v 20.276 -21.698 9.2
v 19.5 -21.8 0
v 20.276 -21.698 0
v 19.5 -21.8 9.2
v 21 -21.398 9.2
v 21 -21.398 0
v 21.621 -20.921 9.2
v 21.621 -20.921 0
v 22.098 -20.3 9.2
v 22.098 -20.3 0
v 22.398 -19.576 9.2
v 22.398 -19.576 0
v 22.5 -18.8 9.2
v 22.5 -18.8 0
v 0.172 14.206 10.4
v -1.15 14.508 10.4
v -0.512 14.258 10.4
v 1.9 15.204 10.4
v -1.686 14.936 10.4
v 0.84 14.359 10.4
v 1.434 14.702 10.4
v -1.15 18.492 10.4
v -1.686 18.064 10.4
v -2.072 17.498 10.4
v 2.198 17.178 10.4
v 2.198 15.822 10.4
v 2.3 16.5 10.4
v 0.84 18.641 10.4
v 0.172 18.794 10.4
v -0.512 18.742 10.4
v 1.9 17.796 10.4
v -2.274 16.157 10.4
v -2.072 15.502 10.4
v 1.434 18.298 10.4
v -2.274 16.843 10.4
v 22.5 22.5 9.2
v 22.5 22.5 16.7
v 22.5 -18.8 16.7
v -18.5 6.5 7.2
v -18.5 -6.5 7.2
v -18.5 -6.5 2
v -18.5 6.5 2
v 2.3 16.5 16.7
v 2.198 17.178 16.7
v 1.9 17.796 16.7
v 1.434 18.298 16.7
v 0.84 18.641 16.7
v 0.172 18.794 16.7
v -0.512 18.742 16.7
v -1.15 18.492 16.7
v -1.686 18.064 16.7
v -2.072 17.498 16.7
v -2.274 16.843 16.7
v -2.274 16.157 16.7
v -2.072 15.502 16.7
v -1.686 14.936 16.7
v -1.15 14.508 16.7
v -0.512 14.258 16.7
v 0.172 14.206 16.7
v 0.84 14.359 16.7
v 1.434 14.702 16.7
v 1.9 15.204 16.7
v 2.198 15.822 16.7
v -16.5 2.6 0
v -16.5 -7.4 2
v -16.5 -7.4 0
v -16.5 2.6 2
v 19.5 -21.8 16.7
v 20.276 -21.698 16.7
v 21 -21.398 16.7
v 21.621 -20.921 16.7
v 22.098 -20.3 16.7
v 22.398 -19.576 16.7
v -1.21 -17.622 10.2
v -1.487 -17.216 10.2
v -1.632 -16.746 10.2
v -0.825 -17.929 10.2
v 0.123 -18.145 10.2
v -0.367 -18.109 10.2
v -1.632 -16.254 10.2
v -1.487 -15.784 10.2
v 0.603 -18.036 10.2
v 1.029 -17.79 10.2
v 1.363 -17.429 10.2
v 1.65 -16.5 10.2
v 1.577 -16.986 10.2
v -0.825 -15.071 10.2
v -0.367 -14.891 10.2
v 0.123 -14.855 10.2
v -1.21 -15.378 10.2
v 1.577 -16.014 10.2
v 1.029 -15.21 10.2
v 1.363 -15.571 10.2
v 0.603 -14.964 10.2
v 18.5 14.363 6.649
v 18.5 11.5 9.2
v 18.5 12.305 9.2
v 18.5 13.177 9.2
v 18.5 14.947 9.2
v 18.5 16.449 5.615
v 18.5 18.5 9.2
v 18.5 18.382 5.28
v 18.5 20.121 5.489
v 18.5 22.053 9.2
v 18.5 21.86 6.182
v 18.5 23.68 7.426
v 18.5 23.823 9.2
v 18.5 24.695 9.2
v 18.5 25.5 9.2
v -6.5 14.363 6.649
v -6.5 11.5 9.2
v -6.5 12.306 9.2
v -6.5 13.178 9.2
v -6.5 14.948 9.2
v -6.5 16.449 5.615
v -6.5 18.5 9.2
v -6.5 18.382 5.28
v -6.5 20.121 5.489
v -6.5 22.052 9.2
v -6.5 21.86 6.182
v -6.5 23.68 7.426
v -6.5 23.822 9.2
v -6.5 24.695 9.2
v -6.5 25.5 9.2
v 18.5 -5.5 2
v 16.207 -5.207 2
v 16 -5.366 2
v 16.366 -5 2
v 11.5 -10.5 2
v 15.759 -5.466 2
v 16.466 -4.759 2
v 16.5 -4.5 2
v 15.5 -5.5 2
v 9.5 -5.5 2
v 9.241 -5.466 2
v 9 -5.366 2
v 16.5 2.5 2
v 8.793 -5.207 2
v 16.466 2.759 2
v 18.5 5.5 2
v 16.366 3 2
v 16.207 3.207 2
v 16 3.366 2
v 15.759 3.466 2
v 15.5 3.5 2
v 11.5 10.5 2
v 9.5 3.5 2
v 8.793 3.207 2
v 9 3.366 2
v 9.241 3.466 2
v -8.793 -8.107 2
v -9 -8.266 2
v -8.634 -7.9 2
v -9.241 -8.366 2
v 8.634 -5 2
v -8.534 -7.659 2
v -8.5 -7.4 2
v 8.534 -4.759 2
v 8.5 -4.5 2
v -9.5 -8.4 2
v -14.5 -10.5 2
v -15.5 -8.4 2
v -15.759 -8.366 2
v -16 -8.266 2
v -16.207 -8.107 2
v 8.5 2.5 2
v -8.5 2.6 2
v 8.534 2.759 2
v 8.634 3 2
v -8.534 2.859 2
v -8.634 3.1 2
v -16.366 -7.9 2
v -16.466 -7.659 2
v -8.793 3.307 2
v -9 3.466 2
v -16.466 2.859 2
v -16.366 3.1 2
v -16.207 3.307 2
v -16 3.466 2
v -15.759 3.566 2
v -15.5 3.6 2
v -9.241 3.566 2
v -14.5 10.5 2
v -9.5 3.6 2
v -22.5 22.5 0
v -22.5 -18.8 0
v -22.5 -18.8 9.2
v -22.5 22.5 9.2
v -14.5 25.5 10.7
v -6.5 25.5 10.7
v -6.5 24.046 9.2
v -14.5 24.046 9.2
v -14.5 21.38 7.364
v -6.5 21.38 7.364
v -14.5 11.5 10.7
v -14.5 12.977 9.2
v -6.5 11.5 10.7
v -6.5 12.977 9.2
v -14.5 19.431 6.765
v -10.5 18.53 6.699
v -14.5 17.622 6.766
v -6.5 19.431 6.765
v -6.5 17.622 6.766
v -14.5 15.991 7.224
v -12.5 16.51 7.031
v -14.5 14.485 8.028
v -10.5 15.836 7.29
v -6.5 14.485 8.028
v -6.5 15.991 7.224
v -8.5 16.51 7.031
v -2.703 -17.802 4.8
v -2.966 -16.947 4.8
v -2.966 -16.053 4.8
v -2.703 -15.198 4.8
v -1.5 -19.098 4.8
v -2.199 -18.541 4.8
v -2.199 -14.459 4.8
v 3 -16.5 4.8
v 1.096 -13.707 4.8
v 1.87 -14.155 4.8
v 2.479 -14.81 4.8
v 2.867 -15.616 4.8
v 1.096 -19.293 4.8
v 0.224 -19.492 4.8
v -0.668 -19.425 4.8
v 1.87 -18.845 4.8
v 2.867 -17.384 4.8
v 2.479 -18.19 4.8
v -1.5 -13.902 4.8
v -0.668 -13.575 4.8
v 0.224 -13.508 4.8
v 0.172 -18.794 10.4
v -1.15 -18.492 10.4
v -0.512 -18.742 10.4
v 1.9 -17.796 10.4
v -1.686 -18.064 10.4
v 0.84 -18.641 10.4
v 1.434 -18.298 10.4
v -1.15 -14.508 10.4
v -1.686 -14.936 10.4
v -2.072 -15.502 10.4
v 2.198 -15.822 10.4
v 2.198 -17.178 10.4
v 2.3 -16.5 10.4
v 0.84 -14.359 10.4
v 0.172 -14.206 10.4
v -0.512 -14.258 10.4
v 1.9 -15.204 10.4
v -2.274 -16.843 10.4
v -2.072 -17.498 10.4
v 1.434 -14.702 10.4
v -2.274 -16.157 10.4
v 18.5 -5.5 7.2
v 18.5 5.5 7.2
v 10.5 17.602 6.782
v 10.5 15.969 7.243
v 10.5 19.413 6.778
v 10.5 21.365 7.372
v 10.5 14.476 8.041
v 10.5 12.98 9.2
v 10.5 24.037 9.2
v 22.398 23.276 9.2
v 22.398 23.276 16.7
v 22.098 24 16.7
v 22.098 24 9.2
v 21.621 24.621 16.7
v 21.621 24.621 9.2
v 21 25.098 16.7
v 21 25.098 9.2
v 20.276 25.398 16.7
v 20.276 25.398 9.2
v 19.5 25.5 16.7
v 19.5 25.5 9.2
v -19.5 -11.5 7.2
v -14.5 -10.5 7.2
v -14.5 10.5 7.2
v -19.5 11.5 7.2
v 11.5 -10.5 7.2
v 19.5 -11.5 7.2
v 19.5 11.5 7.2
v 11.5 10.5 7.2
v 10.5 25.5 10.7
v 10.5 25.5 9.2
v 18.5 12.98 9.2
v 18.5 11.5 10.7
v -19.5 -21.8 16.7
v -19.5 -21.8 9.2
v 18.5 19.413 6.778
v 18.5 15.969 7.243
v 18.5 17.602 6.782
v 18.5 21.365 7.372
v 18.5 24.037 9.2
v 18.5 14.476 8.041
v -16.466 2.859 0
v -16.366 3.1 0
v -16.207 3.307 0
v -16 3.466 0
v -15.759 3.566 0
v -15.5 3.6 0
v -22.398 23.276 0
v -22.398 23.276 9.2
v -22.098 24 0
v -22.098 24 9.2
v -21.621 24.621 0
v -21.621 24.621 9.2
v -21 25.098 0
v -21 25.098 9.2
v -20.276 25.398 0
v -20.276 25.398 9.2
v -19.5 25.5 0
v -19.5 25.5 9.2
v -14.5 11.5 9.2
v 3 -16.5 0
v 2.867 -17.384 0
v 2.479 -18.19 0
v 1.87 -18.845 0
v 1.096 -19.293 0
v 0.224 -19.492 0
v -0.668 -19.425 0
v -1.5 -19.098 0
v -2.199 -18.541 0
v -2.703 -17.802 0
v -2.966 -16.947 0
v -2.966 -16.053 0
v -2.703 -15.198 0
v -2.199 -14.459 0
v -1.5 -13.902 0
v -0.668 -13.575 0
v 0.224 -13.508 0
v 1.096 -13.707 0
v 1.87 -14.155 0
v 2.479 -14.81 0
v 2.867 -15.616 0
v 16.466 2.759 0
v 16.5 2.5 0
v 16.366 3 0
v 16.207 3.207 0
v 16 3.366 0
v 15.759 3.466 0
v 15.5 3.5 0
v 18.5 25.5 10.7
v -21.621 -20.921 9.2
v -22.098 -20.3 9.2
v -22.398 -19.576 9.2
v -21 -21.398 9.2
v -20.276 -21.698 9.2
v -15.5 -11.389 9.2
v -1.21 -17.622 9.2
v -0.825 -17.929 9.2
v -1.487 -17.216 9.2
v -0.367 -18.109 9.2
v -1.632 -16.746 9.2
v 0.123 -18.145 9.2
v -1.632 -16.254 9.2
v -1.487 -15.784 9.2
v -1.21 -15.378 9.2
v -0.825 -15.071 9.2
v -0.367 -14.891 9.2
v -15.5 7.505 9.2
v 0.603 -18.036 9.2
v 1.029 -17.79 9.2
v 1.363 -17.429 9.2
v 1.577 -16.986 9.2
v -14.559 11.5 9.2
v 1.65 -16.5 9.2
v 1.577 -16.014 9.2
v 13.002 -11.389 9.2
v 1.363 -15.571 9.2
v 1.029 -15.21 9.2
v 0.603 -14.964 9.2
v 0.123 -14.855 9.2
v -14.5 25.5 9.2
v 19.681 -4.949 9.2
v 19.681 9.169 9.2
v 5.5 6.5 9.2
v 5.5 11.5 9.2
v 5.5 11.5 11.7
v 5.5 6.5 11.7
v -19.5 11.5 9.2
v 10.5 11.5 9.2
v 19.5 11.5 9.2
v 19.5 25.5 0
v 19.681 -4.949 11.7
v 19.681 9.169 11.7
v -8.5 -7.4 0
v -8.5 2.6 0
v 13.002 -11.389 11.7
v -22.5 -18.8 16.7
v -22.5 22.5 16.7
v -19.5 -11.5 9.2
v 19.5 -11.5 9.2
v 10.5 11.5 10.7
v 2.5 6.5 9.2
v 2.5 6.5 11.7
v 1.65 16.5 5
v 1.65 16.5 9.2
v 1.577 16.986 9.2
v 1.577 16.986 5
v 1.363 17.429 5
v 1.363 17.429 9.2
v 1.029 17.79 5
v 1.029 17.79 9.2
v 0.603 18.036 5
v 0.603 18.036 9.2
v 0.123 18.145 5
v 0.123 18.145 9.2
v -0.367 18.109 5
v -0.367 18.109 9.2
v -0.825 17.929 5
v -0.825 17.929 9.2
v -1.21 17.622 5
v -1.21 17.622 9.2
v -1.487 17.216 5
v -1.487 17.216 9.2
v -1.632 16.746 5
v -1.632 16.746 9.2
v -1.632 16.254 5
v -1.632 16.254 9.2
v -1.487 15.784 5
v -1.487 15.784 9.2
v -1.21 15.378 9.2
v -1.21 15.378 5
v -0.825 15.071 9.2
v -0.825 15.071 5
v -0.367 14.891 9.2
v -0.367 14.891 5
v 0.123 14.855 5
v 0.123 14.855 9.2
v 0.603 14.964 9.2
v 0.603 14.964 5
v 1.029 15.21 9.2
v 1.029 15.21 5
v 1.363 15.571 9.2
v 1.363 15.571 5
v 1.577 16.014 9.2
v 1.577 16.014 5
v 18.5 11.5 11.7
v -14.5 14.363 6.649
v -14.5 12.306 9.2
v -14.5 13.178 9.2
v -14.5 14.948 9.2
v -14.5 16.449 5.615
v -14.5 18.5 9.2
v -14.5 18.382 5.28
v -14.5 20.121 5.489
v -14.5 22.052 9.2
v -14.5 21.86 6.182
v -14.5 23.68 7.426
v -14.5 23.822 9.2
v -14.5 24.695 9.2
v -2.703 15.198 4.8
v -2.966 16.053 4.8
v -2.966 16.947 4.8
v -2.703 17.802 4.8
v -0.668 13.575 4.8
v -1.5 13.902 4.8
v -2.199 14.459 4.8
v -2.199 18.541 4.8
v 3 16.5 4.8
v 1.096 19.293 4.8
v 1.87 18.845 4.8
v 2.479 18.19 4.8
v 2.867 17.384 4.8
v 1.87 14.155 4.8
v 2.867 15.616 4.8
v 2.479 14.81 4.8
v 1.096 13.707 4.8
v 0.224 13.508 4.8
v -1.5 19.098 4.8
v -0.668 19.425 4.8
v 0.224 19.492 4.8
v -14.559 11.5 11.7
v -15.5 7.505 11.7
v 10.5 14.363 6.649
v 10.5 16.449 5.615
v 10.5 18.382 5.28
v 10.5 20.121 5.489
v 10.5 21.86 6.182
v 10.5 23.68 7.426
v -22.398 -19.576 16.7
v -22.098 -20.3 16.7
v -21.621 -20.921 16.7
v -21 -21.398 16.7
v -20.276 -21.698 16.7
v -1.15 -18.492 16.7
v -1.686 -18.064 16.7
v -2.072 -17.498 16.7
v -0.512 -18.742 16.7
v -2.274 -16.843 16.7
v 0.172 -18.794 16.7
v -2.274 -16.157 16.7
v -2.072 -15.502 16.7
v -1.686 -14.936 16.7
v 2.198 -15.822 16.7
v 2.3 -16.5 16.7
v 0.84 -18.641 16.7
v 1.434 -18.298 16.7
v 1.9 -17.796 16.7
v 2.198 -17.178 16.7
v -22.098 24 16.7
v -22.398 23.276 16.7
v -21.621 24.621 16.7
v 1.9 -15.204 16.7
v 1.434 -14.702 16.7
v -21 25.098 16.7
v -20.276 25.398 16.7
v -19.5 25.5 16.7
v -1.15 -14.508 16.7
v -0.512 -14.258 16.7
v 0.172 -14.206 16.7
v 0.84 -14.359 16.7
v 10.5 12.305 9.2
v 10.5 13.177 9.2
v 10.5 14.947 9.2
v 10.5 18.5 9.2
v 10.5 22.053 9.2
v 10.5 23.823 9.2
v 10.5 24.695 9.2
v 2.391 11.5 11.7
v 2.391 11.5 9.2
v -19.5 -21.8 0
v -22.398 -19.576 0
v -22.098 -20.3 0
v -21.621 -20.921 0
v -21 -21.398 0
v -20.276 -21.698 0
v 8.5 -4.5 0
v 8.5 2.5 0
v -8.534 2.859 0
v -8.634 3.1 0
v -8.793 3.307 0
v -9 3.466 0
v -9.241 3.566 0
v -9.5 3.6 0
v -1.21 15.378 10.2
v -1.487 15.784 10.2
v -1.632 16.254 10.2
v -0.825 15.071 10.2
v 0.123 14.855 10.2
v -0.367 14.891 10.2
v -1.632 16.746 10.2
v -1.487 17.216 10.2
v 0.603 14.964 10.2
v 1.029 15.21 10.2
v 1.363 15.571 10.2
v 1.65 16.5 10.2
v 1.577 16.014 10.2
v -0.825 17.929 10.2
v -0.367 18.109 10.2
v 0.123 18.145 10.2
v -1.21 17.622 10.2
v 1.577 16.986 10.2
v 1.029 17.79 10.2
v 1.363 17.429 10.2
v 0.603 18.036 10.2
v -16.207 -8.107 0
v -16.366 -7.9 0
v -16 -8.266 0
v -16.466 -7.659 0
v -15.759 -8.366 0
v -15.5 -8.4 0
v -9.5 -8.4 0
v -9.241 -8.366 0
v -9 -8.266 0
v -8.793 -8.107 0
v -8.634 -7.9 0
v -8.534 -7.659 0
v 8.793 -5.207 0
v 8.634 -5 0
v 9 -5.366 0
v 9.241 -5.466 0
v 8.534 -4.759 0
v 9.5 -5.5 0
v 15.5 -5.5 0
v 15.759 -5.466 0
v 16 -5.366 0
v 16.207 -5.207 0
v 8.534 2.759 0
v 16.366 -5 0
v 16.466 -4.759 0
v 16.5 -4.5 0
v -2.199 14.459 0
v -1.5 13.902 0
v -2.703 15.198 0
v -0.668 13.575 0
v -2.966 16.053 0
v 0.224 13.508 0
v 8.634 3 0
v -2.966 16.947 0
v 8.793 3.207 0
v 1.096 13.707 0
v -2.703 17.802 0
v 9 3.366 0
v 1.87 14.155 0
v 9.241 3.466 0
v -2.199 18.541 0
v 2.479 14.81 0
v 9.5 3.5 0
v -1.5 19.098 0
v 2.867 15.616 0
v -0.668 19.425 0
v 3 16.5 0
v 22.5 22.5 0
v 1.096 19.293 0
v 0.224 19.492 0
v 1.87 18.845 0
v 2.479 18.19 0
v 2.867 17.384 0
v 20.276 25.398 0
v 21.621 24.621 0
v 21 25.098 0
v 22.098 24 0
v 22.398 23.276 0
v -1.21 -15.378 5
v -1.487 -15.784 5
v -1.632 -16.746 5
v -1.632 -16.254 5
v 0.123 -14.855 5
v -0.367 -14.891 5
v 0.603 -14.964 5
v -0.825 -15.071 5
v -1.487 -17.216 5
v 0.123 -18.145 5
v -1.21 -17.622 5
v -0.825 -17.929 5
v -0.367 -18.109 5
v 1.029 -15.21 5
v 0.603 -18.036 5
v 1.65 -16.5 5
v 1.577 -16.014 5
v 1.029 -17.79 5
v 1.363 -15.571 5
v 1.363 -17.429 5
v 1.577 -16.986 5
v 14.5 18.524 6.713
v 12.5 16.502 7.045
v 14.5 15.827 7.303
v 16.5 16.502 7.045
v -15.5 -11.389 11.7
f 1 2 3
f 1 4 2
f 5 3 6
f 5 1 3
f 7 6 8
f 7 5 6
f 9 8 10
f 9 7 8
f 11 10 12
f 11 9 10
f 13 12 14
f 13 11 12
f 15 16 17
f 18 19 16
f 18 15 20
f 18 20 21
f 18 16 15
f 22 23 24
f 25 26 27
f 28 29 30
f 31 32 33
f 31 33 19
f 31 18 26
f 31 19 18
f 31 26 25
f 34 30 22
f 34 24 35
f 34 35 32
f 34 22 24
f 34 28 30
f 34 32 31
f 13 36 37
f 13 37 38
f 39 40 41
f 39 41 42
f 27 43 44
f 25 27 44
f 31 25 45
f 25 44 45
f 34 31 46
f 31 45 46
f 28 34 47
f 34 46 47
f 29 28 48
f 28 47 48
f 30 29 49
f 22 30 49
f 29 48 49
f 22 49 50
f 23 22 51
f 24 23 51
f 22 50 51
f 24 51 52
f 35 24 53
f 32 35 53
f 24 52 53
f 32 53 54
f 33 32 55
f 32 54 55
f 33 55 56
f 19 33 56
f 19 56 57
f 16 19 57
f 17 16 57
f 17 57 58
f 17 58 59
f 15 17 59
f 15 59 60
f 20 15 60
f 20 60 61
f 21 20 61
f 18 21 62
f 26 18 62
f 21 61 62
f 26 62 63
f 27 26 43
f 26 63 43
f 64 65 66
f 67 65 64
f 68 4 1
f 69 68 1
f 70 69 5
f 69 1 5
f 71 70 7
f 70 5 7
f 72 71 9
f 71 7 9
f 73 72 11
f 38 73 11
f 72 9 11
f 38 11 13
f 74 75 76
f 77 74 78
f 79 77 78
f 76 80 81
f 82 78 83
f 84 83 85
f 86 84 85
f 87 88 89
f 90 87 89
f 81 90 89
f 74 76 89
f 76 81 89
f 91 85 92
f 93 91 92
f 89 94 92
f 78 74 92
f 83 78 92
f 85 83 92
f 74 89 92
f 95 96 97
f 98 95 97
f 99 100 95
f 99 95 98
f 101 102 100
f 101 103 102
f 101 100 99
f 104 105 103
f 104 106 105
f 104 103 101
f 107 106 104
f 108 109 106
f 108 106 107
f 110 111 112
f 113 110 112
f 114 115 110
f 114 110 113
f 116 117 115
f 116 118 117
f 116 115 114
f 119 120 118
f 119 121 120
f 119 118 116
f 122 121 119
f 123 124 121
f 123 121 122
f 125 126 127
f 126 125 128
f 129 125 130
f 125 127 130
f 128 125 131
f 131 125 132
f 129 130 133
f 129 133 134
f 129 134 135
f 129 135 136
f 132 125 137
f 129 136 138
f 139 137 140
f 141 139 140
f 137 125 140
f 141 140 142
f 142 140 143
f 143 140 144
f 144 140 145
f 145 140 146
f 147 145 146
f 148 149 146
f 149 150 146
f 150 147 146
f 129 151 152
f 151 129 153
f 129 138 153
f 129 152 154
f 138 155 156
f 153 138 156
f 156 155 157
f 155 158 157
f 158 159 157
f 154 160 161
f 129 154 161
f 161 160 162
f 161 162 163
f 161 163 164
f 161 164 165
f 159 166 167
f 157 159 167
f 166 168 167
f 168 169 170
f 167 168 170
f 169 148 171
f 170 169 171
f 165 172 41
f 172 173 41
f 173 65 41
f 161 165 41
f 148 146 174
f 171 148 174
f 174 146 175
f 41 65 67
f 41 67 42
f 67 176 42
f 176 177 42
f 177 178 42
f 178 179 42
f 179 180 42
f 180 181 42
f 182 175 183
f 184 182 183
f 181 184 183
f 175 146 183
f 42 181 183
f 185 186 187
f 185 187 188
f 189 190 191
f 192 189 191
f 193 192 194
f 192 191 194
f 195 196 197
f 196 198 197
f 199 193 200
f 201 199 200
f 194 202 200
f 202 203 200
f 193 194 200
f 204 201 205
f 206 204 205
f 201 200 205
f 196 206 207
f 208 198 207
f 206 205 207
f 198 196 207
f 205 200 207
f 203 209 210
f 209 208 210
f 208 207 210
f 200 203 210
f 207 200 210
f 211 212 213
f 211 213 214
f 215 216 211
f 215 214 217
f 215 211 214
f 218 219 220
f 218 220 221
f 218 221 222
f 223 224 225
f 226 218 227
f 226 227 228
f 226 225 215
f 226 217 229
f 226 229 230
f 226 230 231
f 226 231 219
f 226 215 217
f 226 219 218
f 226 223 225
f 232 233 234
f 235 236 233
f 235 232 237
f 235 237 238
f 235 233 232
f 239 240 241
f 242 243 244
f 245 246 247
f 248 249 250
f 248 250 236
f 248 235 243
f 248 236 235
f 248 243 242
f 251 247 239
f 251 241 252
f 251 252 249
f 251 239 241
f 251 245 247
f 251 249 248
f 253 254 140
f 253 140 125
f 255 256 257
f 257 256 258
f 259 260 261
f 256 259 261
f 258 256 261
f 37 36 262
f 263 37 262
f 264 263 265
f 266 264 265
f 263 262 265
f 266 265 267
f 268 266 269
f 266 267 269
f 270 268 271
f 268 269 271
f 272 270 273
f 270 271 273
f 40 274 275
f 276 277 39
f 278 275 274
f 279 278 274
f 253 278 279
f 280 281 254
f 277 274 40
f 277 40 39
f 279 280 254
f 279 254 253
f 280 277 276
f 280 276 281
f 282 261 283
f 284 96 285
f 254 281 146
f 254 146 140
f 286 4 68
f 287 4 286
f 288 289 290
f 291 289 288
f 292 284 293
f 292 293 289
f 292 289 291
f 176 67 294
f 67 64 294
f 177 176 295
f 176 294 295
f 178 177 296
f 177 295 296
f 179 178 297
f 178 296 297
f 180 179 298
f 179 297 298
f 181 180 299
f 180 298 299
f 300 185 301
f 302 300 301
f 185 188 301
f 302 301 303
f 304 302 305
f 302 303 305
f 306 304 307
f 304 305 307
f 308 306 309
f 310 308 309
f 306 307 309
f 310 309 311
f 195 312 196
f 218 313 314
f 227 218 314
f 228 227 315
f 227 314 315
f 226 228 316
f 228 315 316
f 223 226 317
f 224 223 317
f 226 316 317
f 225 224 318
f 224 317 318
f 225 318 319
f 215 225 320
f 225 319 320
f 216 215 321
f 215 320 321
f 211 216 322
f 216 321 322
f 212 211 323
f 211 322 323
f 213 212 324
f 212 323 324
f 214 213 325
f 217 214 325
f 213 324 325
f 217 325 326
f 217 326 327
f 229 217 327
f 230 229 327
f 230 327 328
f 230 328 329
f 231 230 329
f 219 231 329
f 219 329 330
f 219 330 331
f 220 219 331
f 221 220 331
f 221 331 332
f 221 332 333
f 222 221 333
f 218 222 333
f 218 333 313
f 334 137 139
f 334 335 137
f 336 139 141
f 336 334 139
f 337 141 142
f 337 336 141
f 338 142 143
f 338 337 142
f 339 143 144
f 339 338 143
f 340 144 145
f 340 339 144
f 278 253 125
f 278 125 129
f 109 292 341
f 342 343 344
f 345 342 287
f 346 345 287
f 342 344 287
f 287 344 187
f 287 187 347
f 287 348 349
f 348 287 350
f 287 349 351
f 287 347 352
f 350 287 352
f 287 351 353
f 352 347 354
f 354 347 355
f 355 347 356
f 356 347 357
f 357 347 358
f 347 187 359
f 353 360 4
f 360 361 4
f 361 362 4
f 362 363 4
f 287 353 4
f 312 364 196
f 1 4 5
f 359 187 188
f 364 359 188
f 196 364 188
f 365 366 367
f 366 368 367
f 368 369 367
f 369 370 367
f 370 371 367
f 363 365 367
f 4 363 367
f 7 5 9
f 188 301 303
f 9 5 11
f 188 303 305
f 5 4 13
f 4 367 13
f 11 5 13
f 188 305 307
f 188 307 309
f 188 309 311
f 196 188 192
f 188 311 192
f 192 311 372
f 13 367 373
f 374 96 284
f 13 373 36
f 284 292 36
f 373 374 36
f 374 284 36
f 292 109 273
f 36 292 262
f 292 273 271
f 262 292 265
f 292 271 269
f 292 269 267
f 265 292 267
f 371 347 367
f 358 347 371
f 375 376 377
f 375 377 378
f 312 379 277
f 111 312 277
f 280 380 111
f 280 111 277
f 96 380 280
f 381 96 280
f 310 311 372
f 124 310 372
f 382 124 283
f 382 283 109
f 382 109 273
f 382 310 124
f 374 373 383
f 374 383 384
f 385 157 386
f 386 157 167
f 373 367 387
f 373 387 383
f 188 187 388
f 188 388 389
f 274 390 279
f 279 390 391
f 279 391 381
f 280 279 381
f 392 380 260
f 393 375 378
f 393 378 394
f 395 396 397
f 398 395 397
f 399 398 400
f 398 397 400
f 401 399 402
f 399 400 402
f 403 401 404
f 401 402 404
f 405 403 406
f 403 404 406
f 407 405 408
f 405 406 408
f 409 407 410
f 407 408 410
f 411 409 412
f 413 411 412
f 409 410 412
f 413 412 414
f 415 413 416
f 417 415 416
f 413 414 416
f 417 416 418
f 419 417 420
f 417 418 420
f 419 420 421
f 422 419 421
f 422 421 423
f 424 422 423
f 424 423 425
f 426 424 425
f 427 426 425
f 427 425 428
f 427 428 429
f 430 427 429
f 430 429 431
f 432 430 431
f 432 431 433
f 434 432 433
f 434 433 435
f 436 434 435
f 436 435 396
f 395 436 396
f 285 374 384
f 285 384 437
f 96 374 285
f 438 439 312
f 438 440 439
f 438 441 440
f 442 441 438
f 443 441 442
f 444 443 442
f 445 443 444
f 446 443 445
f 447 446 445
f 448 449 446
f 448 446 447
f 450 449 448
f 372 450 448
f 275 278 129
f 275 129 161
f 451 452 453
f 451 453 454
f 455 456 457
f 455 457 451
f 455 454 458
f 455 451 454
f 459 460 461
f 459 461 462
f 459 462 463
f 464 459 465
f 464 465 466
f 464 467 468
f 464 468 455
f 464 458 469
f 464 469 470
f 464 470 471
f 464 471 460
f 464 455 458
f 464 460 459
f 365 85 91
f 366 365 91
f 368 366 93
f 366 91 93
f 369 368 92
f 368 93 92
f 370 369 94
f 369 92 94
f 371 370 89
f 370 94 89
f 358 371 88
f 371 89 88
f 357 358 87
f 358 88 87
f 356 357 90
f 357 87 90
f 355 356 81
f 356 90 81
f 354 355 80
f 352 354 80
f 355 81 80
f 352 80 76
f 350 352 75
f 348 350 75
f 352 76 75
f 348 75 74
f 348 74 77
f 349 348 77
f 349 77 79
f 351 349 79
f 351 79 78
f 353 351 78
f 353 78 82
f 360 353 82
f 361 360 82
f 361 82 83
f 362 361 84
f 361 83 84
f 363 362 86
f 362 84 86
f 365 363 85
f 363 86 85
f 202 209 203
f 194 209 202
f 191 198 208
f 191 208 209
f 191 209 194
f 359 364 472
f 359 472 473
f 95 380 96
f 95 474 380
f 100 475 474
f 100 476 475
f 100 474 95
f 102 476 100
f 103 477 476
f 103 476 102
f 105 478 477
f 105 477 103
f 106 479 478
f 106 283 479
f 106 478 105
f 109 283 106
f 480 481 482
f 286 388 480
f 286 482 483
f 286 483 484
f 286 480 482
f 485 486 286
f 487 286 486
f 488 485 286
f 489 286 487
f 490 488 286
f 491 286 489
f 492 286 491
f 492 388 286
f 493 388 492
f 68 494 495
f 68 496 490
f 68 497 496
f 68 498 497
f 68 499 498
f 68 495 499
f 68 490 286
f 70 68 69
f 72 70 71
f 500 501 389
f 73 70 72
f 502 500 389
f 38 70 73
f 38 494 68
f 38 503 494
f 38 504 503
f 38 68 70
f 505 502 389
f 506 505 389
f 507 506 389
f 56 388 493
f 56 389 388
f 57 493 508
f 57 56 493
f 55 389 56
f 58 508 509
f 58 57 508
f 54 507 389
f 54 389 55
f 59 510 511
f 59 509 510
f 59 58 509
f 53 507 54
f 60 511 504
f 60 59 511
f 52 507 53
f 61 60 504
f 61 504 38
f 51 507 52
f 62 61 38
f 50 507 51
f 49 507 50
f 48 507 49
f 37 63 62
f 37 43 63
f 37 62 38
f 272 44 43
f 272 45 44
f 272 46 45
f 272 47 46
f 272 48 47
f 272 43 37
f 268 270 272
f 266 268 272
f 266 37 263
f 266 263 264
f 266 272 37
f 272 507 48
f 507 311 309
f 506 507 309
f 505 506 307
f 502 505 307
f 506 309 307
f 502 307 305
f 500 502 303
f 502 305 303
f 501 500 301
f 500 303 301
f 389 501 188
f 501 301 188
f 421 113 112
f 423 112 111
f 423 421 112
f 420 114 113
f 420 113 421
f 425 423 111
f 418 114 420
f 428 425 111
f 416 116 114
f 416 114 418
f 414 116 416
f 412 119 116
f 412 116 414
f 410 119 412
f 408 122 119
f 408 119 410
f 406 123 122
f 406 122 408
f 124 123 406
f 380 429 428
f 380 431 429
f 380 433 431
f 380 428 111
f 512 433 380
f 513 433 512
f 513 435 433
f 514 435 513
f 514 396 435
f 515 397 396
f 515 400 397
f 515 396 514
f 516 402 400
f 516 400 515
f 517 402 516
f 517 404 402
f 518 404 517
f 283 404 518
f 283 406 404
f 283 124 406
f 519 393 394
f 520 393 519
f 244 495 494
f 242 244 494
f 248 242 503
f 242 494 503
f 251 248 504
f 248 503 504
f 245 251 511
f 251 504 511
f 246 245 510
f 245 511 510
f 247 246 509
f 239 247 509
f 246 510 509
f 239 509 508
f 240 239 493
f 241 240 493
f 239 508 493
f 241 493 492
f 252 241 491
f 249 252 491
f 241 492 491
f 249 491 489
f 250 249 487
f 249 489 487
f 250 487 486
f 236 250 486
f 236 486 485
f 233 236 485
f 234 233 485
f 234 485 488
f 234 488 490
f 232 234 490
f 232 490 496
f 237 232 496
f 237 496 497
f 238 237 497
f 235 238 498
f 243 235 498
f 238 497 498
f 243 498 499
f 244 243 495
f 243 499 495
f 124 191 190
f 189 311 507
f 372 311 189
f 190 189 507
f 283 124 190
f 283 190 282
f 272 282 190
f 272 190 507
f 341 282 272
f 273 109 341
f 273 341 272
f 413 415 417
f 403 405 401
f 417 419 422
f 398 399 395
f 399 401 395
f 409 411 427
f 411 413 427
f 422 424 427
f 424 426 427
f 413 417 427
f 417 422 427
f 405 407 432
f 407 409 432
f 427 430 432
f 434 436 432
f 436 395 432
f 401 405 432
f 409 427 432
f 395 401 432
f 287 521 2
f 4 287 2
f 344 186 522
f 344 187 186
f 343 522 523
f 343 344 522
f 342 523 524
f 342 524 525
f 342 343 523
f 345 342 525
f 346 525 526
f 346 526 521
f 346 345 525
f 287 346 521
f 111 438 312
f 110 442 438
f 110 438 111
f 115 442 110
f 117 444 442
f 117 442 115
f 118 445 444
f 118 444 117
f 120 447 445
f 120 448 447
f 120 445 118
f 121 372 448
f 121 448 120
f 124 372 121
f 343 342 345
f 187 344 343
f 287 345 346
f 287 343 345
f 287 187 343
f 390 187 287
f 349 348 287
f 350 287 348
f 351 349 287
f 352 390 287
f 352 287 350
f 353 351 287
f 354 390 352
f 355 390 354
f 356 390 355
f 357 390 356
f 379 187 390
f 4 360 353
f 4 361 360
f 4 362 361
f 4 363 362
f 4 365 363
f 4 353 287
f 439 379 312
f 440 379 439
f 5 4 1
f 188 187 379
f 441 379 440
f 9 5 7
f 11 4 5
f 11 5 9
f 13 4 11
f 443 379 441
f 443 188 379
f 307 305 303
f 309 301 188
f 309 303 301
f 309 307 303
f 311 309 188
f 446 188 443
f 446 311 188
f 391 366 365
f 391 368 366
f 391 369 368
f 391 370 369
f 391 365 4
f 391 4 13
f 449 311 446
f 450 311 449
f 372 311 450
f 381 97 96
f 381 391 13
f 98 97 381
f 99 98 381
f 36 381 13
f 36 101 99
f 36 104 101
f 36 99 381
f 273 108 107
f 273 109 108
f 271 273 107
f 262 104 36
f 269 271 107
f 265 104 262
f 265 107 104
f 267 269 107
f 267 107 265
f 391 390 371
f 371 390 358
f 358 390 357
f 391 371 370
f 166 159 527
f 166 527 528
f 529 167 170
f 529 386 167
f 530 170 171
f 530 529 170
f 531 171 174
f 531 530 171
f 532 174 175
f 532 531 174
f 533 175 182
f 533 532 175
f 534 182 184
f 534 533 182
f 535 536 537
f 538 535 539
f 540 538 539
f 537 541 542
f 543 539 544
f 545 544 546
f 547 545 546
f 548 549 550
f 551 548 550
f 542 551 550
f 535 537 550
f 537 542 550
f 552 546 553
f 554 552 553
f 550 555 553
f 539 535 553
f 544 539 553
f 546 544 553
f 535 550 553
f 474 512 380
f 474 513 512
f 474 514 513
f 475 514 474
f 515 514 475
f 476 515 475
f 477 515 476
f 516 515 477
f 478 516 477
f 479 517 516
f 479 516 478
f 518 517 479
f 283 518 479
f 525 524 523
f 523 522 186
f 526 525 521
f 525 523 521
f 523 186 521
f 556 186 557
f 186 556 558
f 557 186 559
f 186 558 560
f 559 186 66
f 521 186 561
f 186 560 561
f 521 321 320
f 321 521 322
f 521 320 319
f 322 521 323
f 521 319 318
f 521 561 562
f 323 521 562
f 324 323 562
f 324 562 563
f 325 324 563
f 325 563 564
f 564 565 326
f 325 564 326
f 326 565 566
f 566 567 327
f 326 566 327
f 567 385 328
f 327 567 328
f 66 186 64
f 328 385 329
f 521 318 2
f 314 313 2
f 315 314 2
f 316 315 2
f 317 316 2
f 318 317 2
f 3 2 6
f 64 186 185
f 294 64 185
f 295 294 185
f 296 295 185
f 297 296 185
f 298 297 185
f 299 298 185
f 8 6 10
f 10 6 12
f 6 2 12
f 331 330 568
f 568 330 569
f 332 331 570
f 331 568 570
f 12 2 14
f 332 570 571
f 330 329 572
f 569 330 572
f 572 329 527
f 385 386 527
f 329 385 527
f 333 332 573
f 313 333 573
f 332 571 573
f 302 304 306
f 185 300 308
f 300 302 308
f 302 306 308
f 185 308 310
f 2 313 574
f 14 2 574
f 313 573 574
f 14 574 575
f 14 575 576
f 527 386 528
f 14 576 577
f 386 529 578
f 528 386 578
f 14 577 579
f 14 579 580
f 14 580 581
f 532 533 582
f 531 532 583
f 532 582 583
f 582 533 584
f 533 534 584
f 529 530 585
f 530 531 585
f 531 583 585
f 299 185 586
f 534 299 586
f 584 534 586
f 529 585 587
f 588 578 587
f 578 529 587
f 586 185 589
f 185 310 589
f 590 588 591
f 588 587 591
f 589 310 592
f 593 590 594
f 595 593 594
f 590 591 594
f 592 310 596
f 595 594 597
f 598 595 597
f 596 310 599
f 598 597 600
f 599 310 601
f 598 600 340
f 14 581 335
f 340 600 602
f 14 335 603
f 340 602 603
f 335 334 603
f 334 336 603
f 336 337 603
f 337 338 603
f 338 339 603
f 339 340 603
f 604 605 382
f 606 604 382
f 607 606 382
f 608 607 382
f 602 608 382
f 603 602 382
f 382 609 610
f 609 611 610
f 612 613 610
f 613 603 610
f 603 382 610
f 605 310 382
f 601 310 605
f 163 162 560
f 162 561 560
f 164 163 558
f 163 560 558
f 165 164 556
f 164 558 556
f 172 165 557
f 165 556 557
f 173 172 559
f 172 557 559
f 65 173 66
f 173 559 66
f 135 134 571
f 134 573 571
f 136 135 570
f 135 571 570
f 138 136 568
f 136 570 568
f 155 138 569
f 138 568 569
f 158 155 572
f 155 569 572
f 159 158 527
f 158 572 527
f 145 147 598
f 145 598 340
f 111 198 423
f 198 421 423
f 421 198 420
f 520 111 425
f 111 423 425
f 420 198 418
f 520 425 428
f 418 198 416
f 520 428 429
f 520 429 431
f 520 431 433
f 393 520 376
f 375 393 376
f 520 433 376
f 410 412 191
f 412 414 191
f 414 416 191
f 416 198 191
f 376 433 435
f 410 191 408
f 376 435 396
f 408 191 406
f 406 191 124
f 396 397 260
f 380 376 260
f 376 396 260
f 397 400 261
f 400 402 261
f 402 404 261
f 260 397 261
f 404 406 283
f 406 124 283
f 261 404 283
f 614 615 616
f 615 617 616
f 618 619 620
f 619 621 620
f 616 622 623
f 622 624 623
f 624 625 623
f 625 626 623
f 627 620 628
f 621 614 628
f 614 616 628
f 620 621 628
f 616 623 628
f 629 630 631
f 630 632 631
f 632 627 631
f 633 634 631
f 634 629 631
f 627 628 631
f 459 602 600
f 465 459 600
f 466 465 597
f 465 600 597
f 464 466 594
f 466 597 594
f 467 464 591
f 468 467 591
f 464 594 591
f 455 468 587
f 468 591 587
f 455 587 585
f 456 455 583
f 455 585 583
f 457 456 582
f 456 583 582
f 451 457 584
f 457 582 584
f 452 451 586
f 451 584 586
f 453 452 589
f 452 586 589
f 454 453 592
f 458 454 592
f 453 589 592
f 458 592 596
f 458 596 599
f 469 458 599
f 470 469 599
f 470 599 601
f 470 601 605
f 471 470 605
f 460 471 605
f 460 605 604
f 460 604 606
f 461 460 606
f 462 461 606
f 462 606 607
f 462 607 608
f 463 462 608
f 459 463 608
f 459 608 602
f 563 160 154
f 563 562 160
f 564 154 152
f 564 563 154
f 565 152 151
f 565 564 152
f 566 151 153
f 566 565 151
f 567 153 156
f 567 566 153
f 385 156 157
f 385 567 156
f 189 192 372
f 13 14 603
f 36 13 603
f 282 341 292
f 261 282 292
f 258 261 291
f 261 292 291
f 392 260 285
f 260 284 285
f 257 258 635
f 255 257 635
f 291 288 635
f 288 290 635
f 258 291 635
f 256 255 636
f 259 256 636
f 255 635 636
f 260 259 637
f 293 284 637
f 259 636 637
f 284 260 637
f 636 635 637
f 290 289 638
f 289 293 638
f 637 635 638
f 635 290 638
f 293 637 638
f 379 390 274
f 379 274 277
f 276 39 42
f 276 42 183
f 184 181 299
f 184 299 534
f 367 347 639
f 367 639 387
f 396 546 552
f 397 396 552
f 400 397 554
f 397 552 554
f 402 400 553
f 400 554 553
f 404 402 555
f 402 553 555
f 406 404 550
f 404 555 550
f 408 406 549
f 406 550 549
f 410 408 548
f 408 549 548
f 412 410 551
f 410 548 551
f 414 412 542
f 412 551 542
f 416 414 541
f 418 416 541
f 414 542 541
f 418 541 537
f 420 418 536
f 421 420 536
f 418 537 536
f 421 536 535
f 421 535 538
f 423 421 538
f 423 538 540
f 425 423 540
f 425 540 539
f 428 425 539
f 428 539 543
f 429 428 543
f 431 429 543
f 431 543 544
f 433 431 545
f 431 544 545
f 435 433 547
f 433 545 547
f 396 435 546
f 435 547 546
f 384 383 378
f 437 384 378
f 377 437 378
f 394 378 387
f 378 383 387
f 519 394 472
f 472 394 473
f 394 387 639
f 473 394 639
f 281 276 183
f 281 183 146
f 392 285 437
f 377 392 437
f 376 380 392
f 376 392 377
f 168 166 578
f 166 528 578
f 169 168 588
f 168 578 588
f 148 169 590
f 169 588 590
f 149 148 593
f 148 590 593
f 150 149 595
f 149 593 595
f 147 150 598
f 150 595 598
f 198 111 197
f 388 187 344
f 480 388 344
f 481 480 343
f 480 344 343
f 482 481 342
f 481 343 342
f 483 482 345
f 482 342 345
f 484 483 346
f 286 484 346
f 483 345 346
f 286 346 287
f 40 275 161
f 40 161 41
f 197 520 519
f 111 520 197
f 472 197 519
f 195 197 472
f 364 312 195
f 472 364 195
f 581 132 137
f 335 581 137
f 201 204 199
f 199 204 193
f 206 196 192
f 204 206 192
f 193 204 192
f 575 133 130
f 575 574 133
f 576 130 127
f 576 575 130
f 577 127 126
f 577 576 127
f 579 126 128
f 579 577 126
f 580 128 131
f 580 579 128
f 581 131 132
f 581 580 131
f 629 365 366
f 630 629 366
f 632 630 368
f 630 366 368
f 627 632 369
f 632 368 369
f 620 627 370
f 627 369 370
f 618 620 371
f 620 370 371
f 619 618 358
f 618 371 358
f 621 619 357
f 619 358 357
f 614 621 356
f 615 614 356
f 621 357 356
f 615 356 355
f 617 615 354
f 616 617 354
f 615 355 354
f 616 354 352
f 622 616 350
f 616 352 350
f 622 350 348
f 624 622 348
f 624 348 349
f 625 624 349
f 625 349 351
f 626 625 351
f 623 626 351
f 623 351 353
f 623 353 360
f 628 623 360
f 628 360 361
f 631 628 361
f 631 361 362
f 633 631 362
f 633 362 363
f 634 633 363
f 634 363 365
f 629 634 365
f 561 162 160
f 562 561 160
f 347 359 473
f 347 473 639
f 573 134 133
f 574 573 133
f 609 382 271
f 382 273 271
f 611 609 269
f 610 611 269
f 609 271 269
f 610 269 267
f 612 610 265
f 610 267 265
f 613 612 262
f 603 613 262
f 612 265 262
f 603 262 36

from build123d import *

# Parameters (mm, degrees)
SKETCH001_W     = 45
SKETCH001_H     = 47.3
PAD_DEPTH       = 9.2
SKETCH002_W     = 39
SKETCH002_H     = 23
POCKET_DEPTH    = 2
SKETCH003_R     = 1.65
POCKET001_DEPTH = 9.201
POCKET002_DEPTH = 5.2
SKETCH005_W     = 8
SKETCH005_H     = 9
SKETCH005_H_2   = 12
POCKET003_DEPTH = 2.001
SKETCH006_R     = 3
POCKET004_DEPTH = 5
SKETCH007_W     = 11.325413
SKETCH007_H     = 8.270186
SKETCH007_W_2   = 9.060331
SKETCH007_H_2   = 7.532717
PAD001_DEPTH    = 0.2
FILLET_R        = 3
FILLET001_R     = 1
FILLET002_R     = 1
SKETCH008_W     = 8
SKETCH008_H     = 1.5
SKETCH009_W     = 8
SKETCH009_H     = 5.341081
SKETCH010_W     = 8
SKETCH010_H     = 1.5
SKETCH011_W     = 8
SKETCH011_H     = 1.5
SKETCH012_W     = 8
SKETCH012_H     = 5.421419
SKETCH013_W     = 8
SKETCH013_H     = 1.5
PAD002_DEPTH    = 7.5
SKETCH015_R     = 2.3
POCKET005_DEPTH = 6.3
SKETCH016_R     = 1.65
POCKET006_DEPTH = 1
POCKET007_DEPTH = 2.5
SKETCH018_W     = 8
SKETCH018_H     = 1.5
POCKET008_DEPTH = 14.001
PAD003_DEPTH    = 8
PAD004_DEPTH    = 8


with BuildPart() as ltop:
    # Sketch001 → Pad (new body)
    with BuildSketch(Plane.XY):
        with Locations((0, 1.85)):
            Rectangle(SKETCH001_W, SKETCH001_H)
    extrude(amount=PAD_DEPTH)

    # Sketch002 (on Face6 of Pad) → Pocket (cut)
    with BuildSketch(Plane.XY.offset(9.2)):
        Rectangle(SKETCH002_W, SKETCH002_H)
    extrude(amount=-POCKET_DEPTH, mode=Mode.SUBTRACT)

    # Sketch003 (on Face5 of Pocket) → Pocket001 (cut, through all)
    with BuildSketch(Plane.XY.offset(9.2)):
        with Locations((0, 16.5)):
            Circle(SKETCH003_R)
        with Locations((0, -16.5)):
            Circle(SKETCH003_R)
    extrude(amount=-POCKET001_DEPTH, mode=Mode.SUBTRACT)

    # Sketch004 (on Face13 of Pocket001) → Pocket002 (cut)
    with BuildSketch(Plane.XY.offset(7.2)):
        Polygon((-18.5, 6.5), (-14.5, 10.5), (11.5, 10.5), (18.5, 5.5), (18.5, -5.5), (11.5, -10.5), (-14.5, -10.5), (-18.5, -6.5), align=None)
    extrude(amount=-POCKET002_DEPTH, mode=Mode.SUBTRACT)

    # Sketch005 (on Face22 of Pocket002) → Pocket003 (cut, through all)
    with BuildSketch(Plane.XY.offset(2)):
        with Locations((12.5, -1)):
            Rectangle(SKETCH005_W, SKETCH005_H)
        with Locations((-12.5, -2.4)):
            Rectangle(SKETCH005_W, SKETCH005_H_2)
    extrude(amount=-POCKET003_DEPTH, mode=Mode.SUBTRACT)

    # Sketch006 (on Face4 of Pocket003) → Pocket004 (cut)
    with BuildSketch(Plane(origin=(0, 0, 0), x_dir=(1, 0, 0), z_dir=(0, 0, -1))):
        with Locations((0, 16.5)):
            Circle(SKETCH006_R)
        with Locations((0, -16.5)):
            Circle(SKETCH006_R)
    extrude(amount=-POCKET004_DEPTH, mode=Mode.SUBTRACT)

    # Sketch007 (on Face25 of Pocket004) → Pad001 (join)
    with BuildSketch(Plane(origin=(0, 0, 5), x_dir=(1, 0, 0), z_dir=(0, 0, -1))):
        with Locations((0.619854, 16.600148)):
            Rectangle(SKETCH007_W, SKETCH007_H)
        with Locations((-1.19748, -16.743977)):
            Rectangle(SKETCH007_W_2, SKETCH007_H_2)
    extrude(amount=PAD001_DEPTH)

    # Fillet
    fillet_edges = [ltop.edges().sort_by_distance(p)[0] for p in [
        (22.5, -21.8, 4.6),
        (22.5, 25.5, 4.6),
        (-22.5, 25.5, 4.6),
        (-22.5, -21.8, 4.6),
    ]]
    fillet(fillet_edges, radius=FILLET_R)

    # Fillet001
    fillet001_edges = [ltop.edges().sort_by_distance(p)[0] for p in [
        (16.5, 3.5, 1),
        (16.5, -5.5, 1),
        (8.5, -5.5, 1),
        (8.5, 3.5, 1),
    ]]
    fillet(fillet001_edges, radius=FILLET001_R)

    # Fillet002
    fillet002_edges = [ltop.edges().sort_by_distance(p)[0] for p in [
        (-8.5, 3.6, 1),
        (-8.5, -8.4, 1),
        (-16.5, -8.4, 1),
        (-16.5, 3.6, 1),
    ]]
    fillet(fillet002_edges, radius=FILLET002_R)

    # Sketch008 (on Face43 of Fillet002) → SubtractiveLoft section 0
    with BuildSketch(Plane.XZ.offset(-11.5)):
        with Locations((14.5, 9.95)):
            Rectangle(SKETCH008_W, SKETCH008_H)
    # Sketch009 (on DatumPlane) → SubtractiveLoft section 1
    with BuildSketch(Plane(origin=(0, 18.5, 24), x_dir=(1, 0, 0), z_dir=(0, -1, 0))):
        with Locations((14.5, -16.050878)):
            Rectangle(SKETCH009_W, SKETCH009_H)
    # Sketch010 (on Face18 of Fillet002) → SubtractiveLoft section 2
    with BuildSketch(Plane(origin=(0, 25.5, 0), x_dir=(-1, 0, 0), z_dir=(0, 1, 0))):
        with Locations((-14.5, 9.95)):
            Rectangle(SKETCH010_W, SKETCH010_H)
    loft(mode=Mode.SUBTRACT)

    # Sketch011 (on Face42 of SubtractiveLoft) → SubtractiveLoft001 section 0
    with BuildSketch(Plane.XZ.offset(-11.5)):
        with Locations((-10.5, 9.95)):
            Rectangle(SKETCH011_W, SKETCH011_H)
    # Sketch012 (on DatumPlane) → SubtractiveLoft001 section 1
    with BuildSketch(Plane(origin=(0, 18.5, 24), x_dir=(1, 0, 0), z_dir=(0, -1, 0))):
        with Locations((-10.5, -16.01071)):
            Rectangle(SKETCH012_W, SKETCH012_H)
    # Sketch013 (on Face18 of SubtractiveLoft) → SubtractiveLoft001 section 2
    with BuildSketch(Plane(origin=(0, 25.5, 0), x_dir=(-1, 0, 0), z_dir=(0, 1, 0))):
        with Locations((10.5, 9.95)):
            Rectangle(SKETCH013_W, SKETCH013_H)
    loft(mode=Mode.SUBTRACT)


with BuildPart() as lbottom:
    # Sketch014 → Pad002 (new body)
    with BuildSketch(Plane.XY.offset(9.2)):
        with BuildLine():
            ThreePointArc((-19.5, 25.5), (-21.62132, 24.62132), (-22.5, 22.5))
            Line((-22.5, -18.8), (-22.5, 22.5))
            ThreePointArc((-22.5, -18.8), (-21.62132, -20.92132), (-19.5, -21.8))
            Line((19.5, -21.8), (-19.5, -21.8))
            ThreePointArc((19.5, -21.8), (21.62132, -20.92132), (22.5, -18.8))
            Line((22.5, 22.5), (22.5, -18.8))
            ThreePointArc((22.5, 22.5), (21.62132, 24.62132), (19.5, 25.5))
            Line((-19.5, 25.5), (19.5, 25.5))
        make_face()
    extrude(amount=PAD002_DEPTH)

    # Sketch015 (on Face10 of Pad002) → Pocket005 (cut)
    with BuildSketch(Plane.XY.offset(16.7)):
        with Locations((0, 16.5)):
            Circle(SKETCH015_R)
        with Locations((0, -16.5)):
            Circle(SKETCH015_R)
    extrude(amount=-POCKET005_DEPTH, mode=Mode.SUBTRACT)

    # Sketch016 (on Face14 of Pocket005) → Pocket006 (cut)
    with BuildSketch(Plane.XY.offset(10.2)):
        with Locations((0, 16.5)):
            Circle(SKETCH016_R)
        with Locations((0, -16.5)):
            Circle(SKETCH016_R)
    extrude(amount=-POCKET006_DEPTH, mode=Mode.SUBTRACT)

    # Sketch017 (on Face4 of Pocket006) → Pocket007 (cut)
    with BuildSketch(Plane(origin=(0, 0, 9.2), x_dir=(1, 0, 0), z_dir=(0, 0, -1))):
        Polygon((-15.5, -7.505032), (-15.5, 11.388588), (13.002408, 11.388588), (19.680809, 4.948578), (19.680809, -9.168692), (18.5, -11.5), (5.5, -11.5), (5.5, -6.5), (2.5, -6.5), (2.390748, -11.5), (-14.558839, -11.5), align=None)
    extrude(amount=-POCKET007_DEPTH, mode=Mode.SUBTRACT)

    # Sketch018 (on Face22 of Pocket007) → Pocket008 (cut, through all)
    with BuildSketch(Plane.XZ.offset(-11.5)):
        with Locations((-10.5, 9.95)):
            Rectangle(SKETCH018_W, SKETCH018_H)
        with Locations((14.5, 9.95)):
            Rectangle(SKETCH018_W, SKETCH018_H)
    extrude(amount=-POCKET008_DEPTH, mode=Mode.SUBTRACT)

    # Sketch019 (on Face12 of Pocket008) → Pad003 (join)
    with BuildSketch(Plane(origin=(18.5, 0, 0), x_dir=(0, -1, 0), z_dir=(-1, 0, 0))):
        with BuildLine():
            Line((-25.5, 10.7), (-11.5, 10.7))
            add(Edge.make_bspline(
                [(-25.5, 10.7), (-18.54731, 2.726345), (-11.5, 10.7)],
                knots=[0, 0, 0, 1, 1, 1], degree=2))
        make_face()
    extrude(amount=PAD003_DEPTH)

    # Sketch020 (on Face8 of Pad003) → Pad004 (join)
    with BuildSketch(Plane(origin=(-6.5, 0, 0), x_dir=(0, -1, 0), z_dir=(-1, 0, 0))):
        with BuildLine():
            Line((-25.5, 10.7), (-11.5, 10.7))
            add(Edge.make_bspline(
                [(-25.5, 10.7), (-18.560717, 2.697259), (-11.5, 10.7)],
                knots=[0, 0, 0, 1, 1, 1], degree=2))
        make_face()
    extrude(amount=PAD004_DEPTH)


solid = Compound([ltop.part, lbottom.part])
